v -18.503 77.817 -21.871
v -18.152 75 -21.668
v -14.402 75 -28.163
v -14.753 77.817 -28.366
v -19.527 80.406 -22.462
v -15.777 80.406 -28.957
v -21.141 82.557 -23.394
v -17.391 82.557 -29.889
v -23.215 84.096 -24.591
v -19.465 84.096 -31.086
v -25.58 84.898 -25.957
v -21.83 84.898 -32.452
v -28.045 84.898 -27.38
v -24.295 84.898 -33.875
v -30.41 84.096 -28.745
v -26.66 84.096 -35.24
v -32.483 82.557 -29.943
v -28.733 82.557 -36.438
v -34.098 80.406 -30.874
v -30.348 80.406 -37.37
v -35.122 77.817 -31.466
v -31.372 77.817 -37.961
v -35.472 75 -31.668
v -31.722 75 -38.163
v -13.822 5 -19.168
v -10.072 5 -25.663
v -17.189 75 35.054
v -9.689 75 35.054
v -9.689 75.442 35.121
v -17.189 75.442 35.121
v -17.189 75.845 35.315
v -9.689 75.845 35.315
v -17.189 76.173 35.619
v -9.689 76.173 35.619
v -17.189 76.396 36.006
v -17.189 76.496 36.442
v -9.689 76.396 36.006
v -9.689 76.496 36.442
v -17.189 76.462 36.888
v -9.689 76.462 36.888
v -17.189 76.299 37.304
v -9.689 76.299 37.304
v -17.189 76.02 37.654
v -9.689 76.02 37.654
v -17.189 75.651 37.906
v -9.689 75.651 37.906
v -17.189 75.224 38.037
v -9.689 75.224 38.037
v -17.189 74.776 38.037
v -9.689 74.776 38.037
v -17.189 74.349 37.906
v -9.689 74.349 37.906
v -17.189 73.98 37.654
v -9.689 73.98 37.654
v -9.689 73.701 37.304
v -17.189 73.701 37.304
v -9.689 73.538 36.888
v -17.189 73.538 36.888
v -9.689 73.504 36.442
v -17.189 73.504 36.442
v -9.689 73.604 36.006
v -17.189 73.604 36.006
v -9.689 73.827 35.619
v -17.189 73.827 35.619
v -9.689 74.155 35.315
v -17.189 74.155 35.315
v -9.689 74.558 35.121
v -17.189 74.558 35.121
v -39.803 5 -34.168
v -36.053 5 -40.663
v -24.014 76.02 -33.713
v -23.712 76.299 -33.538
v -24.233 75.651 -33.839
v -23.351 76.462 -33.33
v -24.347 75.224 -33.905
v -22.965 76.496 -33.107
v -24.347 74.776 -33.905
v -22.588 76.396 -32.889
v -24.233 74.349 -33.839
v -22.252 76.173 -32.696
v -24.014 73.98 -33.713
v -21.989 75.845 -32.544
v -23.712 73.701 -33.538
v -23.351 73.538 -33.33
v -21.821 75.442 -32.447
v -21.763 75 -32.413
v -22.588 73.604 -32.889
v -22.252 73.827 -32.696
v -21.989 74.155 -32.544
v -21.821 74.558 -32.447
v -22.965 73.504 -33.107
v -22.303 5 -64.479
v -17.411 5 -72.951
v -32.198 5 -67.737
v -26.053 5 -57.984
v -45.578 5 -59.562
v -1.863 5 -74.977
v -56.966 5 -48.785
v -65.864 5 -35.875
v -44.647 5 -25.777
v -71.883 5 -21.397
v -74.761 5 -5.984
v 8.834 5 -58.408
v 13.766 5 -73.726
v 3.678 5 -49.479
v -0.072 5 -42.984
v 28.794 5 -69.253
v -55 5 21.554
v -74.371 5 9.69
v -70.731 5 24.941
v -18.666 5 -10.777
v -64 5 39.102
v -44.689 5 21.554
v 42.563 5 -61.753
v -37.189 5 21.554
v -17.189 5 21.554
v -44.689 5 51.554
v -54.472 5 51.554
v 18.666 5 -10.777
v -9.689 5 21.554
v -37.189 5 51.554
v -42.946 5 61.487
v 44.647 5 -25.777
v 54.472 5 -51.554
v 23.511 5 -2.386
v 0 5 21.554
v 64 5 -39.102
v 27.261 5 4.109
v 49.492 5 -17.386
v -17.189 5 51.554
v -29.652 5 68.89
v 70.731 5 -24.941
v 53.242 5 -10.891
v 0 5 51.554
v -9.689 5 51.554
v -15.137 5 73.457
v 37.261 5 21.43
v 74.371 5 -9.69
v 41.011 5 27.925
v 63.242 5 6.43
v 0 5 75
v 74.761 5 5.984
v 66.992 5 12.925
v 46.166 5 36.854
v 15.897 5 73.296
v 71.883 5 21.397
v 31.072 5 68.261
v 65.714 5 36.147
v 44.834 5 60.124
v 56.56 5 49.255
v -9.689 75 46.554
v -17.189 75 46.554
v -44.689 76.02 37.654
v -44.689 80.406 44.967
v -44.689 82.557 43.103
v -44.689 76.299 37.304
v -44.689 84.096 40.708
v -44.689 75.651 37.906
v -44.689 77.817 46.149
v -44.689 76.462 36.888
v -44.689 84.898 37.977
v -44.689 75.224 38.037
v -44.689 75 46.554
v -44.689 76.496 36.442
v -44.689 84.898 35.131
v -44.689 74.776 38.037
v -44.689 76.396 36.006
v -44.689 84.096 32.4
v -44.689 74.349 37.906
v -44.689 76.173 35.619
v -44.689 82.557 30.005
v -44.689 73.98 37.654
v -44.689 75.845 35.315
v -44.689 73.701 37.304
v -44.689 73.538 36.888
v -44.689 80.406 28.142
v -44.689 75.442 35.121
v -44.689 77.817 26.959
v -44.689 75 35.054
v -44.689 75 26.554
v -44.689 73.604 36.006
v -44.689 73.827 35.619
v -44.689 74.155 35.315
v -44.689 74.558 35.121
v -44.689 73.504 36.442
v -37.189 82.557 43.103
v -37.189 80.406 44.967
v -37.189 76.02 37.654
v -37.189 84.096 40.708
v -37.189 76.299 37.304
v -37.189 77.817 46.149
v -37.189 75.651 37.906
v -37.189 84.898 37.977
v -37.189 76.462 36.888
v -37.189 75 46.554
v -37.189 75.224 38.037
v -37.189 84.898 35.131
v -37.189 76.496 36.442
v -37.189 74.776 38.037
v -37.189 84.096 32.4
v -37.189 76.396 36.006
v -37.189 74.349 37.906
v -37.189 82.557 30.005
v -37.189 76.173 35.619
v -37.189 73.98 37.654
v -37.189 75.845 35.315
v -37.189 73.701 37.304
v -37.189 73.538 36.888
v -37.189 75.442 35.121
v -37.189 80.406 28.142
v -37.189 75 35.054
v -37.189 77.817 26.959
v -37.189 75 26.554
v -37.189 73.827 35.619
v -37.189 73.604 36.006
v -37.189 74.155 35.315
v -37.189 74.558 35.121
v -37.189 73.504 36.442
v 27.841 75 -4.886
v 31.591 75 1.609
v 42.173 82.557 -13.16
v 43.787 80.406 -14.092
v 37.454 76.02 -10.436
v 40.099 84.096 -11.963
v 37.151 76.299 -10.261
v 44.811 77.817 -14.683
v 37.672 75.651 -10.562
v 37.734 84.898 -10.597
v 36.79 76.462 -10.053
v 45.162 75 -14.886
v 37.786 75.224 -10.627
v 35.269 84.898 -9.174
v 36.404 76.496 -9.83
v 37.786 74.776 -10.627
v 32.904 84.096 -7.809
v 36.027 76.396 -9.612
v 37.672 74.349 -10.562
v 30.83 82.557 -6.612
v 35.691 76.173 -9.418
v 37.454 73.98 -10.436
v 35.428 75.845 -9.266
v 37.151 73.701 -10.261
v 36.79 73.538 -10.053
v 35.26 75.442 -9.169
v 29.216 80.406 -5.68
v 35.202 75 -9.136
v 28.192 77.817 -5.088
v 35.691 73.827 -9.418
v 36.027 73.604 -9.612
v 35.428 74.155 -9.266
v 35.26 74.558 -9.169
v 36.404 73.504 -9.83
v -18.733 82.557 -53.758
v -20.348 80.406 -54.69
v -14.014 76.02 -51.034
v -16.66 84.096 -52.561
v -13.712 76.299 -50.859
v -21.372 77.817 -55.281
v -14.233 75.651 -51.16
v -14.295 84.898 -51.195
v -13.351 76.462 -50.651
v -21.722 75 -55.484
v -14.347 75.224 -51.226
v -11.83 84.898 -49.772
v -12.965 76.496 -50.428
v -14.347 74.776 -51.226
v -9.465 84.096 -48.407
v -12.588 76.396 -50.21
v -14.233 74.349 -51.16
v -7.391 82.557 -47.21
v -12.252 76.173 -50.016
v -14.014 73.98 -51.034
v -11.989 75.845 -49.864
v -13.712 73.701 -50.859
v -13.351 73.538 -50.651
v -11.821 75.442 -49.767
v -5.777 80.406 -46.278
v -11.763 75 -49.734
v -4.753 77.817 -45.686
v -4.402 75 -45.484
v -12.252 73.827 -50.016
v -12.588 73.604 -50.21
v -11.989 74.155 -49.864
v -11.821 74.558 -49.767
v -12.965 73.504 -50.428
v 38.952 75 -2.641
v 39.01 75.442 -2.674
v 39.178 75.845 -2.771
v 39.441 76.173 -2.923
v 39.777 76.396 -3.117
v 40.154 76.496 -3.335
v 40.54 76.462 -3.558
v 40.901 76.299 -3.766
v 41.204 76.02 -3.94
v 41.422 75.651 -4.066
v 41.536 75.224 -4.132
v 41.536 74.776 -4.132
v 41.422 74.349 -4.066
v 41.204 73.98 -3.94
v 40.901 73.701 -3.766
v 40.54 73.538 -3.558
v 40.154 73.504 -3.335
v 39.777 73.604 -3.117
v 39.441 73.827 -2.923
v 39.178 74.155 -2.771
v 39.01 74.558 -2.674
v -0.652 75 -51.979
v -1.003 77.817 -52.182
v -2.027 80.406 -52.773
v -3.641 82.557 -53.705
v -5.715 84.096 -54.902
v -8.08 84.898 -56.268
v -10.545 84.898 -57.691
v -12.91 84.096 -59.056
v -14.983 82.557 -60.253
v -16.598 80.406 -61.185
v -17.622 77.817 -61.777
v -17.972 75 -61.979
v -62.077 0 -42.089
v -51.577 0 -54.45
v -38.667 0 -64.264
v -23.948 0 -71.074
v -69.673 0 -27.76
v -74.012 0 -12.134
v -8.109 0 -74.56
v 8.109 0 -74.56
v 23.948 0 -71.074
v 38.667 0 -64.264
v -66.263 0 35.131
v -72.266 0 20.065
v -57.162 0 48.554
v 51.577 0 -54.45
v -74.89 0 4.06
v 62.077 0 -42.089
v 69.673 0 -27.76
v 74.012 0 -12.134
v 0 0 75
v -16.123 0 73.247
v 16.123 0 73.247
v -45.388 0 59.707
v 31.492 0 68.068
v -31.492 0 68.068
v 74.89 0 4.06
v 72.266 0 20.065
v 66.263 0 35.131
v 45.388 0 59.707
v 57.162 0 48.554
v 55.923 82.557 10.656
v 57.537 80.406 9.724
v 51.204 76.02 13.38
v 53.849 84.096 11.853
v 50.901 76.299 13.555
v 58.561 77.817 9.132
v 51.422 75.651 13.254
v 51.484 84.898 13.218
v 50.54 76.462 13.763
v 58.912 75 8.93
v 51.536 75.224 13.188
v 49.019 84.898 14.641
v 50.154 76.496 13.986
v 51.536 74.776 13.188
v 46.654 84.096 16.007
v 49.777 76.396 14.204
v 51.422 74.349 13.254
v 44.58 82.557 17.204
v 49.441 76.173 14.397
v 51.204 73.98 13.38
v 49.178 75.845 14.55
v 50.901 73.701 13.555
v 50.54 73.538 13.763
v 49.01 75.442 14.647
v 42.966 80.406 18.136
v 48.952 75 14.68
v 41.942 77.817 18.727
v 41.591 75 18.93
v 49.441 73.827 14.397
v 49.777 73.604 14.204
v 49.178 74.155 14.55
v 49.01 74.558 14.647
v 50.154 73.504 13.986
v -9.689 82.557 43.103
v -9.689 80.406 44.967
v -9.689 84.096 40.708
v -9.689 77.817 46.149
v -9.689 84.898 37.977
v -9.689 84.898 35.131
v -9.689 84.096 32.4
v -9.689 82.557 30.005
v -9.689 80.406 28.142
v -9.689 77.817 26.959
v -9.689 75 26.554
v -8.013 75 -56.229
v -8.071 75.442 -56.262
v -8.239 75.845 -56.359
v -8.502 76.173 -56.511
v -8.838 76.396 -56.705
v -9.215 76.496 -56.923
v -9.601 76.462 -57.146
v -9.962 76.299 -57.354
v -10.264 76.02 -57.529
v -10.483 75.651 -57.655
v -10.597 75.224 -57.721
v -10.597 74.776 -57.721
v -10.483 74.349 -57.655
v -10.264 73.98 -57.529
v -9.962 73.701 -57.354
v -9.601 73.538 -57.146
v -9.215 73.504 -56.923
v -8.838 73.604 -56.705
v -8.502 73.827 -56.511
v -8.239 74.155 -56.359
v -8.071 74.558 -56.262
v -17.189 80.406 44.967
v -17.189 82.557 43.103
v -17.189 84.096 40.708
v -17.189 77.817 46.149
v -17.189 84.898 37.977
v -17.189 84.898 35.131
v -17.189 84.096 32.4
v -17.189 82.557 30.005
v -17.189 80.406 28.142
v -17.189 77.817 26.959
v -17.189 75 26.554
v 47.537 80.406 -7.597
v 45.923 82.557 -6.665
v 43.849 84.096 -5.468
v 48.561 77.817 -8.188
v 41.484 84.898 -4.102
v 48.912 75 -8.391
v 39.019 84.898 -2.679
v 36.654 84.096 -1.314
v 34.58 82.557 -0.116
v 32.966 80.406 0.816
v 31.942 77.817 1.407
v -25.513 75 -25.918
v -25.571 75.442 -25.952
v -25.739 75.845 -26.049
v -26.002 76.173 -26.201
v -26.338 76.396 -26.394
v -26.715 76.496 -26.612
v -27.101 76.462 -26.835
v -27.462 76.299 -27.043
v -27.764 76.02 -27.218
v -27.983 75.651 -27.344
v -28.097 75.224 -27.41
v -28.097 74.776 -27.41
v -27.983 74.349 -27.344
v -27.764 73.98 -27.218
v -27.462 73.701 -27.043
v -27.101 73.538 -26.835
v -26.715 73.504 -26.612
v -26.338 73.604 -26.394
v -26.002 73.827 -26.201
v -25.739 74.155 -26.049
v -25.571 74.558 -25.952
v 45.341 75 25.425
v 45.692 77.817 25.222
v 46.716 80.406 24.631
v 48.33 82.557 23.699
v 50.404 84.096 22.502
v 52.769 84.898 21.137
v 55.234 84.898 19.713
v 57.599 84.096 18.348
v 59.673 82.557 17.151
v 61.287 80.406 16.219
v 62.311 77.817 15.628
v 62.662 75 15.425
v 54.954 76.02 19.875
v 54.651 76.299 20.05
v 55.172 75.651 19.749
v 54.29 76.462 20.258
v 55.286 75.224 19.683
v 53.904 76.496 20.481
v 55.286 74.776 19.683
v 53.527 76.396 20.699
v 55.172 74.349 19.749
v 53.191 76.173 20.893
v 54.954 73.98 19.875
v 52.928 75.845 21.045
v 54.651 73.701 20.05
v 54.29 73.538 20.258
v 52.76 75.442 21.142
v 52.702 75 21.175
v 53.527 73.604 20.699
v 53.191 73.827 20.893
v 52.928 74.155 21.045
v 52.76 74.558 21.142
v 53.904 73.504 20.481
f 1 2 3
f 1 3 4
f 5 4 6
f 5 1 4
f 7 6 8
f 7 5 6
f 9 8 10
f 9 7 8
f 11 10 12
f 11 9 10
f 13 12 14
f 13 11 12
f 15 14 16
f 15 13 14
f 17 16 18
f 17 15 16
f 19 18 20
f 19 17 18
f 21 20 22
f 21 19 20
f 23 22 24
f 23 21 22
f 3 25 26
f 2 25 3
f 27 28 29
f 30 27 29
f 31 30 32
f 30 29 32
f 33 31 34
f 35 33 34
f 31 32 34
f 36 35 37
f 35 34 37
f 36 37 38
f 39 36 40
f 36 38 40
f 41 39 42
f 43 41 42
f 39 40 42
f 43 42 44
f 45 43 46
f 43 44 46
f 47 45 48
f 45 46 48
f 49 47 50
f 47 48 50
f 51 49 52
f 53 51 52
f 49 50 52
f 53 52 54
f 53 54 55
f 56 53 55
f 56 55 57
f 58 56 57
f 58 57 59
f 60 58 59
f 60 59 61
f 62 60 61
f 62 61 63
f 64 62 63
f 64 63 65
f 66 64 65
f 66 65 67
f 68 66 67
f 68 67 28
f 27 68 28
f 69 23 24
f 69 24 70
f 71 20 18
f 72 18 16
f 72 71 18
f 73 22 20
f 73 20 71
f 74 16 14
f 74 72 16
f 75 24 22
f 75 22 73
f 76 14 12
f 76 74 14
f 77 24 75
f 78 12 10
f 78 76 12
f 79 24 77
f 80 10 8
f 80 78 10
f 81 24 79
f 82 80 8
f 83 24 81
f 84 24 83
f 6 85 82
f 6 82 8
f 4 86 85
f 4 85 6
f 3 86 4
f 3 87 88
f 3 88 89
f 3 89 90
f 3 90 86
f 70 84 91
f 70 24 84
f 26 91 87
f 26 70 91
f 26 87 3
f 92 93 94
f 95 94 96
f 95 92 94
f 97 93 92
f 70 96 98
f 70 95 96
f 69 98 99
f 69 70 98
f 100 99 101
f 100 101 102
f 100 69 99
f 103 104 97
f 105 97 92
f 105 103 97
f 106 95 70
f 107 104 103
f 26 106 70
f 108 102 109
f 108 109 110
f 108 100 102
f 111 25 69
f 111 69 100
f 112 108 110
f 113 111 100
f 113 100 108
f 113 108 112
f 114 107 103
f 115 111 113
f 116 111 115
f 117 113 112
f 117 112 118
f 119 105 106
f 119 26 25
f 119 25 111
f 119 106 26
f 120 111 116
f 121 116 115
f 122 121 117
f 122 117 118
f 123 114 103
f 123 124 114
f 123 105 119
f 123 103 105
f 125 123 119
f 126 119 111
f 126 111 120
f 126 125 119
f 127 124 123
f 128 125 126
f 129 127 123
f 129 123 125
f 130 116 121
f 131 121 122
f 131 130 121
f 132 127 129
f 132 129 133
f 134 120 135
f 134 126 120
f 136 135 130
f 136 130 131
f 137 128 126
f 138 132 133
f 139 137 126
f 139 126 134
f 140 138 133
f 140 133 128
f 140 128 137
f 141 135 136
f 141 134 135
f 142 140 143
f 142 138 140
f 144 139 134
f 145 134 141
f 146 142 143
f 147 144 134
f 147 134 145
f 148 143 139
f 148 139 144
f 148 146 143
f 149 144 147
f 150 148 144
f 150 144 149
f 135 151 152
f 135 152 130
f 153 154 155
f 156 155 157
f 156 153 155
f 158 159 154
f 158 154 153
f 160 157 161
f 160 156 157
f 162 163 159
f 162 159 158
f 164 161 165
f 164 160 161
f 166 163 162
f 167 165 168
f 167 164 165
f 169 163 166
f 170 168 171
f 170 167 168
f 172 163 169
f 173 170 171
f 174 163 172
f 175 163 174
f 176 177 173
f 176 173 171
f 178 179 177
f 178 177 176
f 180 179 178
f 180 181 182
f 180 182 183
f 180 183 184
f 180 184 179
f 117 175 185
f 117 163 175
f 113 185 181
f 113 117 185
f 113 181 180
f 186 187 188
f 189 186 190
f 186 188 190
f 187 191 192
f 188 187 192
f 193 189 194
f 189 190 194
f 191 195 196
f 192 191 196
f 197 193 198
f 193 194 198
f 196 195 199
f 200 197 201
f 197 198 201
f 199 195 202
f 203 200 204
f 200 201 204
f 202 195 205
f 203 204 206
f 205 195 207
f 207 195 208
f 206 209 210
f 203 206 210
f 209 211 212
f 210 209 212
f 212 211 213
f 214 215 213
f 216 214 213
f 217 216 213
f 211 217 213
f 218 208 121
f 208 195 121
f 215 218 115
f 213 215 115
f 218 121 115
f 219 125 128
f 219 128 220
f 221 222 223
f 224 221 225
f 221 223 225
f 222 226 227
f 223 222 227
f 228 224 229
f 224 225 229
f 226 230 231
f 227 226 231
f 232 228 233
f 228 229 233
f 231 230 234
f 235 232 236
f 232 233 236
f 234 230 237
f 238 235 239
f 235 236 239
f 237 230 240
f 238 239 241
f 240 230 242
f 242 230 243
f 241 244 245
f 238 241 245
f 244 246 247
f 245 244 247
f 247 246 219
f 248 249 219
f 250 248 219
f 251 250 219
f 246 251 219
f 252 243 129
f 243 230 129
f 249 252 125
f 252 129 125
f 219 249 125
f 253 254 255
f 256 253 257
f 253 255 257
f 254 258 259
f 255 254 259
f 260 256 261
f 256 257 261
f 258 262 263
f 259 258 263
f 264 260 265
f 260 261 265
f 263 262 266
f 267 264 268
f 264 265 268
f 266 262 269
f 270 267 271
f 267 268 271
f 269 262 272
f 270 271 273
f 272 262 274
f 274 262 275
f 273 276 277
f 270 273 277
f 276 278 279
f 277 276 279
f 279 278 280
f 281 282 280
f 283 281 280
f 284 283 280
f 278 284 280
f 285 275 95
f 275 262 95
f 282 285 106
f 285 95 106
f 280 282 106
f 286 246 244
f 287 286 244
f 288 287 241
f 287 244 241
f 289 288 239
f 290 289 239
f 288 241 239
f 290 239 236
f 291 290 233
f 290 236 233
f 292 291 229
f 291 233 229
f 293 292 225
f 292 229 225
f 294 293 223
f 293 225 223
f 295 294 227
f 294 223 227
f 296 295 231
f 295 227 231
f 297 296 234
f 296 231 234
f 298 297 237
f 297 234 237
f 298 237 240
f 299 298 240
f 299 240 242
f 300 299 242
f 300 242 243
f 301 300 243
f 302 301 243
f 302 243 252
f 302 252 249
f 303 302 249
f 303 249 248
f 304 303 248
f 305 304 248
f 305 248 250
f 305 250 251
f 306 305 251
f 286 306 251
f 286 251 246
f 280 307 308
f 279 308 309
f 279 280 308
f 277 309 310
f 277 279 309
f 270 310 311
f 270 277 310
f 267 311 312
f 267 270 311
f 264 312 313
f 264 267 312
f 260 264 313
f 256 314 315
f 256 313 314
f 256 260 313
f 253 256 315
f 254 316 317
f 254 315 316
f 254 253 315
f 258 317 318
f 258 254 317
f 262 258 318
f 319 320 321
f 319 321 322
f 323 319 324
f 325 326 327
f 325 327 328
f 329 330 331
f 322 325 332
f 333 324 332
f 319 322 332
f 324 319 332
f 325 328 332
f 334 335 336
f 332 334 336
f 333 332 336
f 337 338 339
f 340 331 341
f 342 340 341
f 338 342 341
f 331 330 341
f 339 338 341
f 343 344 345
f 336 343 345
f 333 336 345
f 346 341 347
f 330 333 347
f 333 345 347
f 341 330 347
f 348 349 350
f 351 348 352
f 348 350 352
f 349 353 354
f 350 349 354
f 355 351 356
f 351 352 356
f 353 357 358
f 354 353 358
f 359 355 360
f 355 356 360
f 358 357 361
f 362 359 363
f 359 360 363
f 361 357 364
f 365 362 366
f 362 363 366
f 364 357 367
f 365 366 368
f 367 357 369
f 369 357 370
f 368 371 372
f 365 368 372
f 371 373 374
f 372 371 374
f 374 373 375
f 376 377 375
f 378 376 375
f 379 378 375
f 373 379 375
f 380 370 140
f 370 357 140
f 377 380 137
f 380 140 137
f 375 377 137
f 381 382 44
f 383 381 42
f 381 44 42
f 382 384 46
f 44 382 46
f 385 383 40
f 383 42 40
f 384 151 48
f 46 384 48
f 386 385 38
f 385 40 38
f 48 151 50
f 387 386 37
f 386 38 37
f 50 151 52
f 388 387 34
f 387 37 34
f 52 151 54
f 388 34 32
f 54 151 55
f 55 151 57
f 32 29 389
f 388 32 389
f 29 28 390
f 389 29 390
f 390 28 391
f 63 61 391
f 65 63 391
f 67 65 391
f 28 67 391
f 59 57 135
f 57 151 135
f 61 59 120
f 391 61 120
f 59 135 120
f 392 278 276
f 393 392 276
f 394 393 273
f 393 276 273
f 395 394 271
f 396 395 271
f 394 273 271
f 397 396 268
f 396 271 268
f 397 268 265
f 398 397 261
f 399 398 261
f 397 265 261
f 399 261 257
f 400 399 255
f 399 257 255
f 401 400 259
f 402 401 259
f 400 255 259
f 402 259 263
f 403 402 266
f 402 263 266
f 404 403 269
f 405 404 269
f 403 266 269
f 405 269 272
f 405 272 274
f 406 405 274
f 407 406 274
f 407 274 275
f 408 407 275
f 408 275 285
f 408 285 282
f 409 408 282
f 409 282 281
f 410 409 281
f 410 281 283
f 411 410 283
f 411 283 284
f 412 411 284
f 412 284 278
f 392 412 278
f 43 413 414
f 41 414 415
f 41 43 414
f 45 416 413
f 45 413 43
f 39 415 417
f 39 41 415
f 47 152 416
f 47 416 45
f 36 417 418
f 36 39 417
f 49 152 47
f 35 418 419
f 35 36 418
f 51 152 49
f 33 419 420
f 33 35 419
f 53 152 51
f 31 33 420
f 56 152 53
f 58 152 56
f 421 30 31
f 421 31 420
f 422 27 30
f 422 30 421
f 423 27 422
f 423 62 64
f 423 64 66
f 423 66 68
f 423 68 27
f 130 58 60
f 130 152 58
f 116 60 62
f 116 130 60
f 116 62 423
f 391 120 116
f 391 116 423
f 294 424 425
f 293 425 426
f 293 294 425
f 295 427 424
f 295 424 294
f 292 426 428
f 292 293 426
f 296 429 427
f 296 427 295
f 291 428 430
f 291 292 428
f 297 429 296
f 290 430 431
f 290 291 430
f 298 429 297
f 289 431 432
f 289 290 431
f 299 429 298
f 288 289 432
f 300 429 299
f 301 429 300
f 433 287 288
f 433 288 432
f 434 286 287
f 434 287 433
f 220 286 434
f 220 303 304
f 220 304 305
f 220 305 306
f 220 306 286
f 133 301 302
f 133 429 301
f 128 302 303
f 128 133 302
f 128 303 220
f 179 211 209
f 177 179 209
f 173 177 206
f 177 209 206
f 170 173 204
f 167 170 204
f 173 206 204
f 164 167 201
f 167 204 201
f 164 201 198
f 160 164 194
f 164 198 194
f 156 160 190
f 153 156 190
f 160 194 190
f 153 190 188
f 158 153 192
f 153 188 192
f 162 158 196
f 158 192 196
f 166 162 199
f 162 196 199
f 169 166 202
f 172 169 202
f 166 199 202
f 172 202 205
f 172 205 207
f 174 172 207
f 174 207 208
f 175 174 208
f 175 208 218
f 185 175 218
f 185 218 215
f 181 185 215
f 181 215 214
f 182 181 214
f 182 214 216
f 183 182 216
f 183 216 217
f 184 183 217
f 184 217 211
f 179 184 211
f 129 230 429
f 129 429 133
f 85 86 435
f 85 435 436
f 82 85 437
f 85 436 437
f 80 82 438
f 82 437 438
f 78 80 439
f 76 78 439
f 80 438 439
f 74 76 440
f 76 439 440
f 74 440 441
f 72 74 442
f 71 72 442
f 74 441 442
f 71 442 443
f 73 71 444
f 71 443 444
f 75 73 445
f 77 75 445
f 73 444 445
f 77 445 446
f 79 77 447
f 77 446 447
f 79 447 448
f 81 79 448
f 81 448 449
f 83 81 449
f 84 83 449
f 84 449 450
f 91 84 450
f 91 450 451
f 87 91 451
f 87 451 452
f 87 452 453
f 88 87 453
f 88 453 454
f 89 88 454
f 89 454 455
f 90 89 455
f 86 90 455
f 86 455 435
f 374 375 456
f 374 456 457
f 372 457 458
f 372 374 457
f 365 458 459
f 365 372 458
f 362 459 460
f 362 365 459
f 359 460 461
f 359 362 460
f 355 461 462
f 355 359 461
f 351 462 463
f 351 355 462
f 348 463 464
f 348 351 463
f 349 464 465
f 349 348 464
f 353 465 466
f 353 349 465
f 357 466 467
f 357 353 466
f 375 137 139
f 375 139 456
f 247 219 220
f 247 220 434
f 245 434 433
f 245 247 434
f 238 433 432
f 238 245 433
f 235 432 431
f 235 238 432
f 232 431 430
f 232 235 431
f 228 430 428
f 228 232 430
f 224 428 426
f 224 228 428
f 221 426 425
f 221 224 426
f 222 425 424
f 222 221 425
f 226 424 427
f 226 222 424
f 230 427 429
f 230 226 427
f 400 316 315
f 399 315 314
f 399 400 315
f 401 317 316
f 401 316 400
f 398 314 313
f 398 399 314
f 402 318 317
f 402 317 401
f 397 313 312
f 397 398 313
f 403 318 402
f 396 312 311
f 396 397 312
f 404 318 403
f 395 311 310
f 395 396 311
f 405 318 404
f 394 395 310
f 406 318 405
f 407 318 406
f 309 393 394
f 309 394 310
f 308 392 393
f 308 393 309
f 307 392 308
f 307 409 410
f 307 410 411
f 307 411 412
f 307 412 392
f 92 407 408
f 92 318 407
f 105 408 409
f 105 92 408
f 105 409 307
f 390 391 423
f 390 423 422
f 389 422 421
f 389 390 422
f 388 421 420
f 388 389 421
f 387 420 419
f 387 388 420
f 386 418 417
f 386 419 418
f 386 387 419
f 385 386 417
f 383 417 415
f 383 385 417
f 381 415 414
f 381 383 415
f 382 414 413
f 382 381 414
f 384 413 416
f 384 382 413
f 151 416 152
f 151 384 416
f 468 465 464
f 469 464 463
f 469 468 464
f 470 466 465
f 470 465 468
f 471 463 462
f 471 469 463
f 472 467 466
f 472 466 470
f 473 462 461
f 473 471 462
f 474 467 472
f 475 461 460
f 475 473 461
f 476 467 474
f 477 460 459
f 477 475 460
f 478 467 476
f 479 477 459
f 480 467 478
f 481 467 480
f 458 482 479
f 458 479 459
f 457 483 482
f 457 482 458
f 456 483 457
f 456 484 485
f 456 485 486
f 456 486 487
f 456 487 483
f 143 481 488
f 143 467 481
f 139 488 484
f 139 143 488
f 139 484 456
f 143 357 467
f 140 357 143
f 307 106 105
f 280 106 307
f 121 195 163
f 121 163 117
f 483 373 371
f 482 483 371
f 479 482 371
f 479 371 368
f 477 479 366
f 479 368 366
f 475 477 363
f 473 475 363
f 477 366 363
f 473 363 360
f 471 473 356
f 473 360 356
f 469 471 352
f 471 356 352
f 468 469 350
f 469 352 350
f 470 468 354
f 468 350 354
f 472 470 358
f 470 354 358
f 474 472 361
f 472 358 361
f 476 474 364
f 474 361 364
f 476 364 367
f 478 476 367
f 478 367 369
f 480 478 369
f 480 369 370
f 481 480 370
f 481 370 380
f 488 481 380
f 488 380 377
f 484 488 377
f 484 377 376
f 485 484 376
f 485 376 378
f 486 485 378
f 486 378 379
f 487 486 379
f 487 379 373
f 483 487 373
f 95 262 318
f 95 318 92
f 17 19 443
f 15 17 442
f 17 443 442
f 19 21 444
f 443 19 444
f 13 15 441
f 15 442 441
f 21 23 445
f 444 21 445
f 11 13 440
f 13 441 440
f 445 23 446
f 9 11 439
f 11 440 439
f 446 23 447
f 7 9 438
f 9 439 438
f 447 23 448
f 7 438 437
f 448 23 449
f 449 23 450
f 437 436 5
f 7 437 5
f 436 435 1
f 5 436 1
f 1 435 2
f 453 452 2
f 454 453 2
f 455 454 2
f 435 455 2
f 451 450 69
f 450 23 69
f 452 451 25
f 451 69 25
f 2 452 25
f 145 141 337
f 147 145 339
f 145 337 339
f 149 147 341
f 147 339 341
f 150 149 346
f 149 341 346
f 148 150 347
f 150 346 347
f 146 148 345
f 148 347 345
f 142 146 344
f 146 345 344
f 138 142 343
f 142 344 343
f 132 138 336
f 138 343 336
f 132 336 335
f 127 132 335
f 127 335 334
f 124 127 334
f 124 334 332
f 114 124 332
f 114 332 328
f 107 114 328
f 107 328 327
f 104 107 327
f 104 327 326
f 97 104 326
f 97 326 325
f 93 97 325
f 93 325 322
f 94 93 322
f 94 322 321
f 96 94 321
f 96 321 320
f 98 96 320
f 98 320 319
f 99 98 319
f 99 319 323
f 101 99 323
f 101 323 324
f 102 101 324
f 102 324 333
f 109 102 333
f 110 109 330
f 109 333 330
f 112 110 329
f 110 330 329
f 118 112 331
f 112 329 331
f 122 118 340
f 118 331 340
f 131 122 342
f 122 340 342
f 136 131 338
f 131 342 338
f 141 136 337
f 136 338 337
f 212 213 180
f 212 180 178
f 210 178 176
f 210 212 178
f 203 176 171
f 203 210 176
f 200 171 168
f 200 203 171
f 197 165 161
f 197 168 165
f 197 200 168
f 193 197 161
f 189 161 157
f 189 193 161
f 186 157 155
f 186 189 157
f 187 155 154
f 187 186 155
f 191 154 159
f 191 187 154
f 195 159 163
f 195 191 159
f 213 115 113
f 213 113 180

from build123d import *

# Parameters (mm, degrees)
SKETCH2_R          = 75
EXTRUDE1_DEPTH     = 5
EXTRUDE3_START     = 5
SKETCH1_W          = 7.5
SKETCH1_H          = 30
EXTRUDE3_DEPTH     = 80
SKETCH3_R          = 1.5
CUT_EXTRUDE1_DEPTH = 55
CIRPATTERN1_COUNT  = 3


with BuildPart() as part:
    # Sketch2 → Extrude1 (new body)
    with BuildSketch(Plane(origin=(0, 0, 0), x_dir=(1, 0, 0), z_dir=(0, 1, 0))):
        with Locations(Location((0, 0, 0), (0, 0, 270))):
            Circle(SKETCH2_R)
    extrude(amount=EXTRUDE1_DEPTH)

    # Sketch1 → Extrude3 (add)
    with BuildSketch(Plane(origin=(0, 0, 0), x_dir=(1, 0, 0), z_dir=(0, 1, 0)).offset(EXTRUDE3_START)):
        with Locations((-13.439285714, -36.554084254)):
            Rectangle(SKETCH1_W, SKETCH1_H)
        with Locations((-40.939285714, -36.554084254)):
            Rectangle(SKETCH1_W, SKETCH1_H)
    extrude3 = extrude(amount=EXTRUDE3_DEPTH)

    # Sketch3 → Cut-Extrude1 (cut)
    with BuildSketch(Plane(origin=(0, 0, 0), x_dir=(0, 0, -1), z_dir=(1, 0, 0))):
        with Locations((-36.554084254, 75)):
            Circle(SKETCH3_R)
        with BuildLine():
            Line((-51.554084254, 5), (-52.554084254, 6))
            Line((-52.554084254, 6), (-52.554084254, 86))
            Line((-52.554084254, 86), (-20.554084254, 86))
            Line((-20.554084254, 86), (-20.554084254, 6))
            Line((-20.554084254, 6), (-21.554084254, 5))
            Line((-21.554084254, 5), (-26.554084254, 75))
            ThreePointArc((-26.554084254, 75), (-36.554084254, 85), (-46.554084254, 75))
            Line((-46.554084254, 75), (-51.554084254, 5))
        make_face()
    cut_extrude1 = extrude(amount=-CUT_EXTRUDE1_DEPTH, mode=Mode.SUBTRACT)

    # CirPattern1: Extrude3, Cut-Extrude1 ×3 about axis
    cirpattern1_axis = Axis((0, 0, 0), (0, 1, 0))
    add([extrude3.rotate(cirpattern1_axis, i * 360 / CIRPATTERN1_COUNT) for i in range(1, CIRPATTERN1_COUNT)])
    add([cut_extrude1.rotate(cirpattern1_axis, i * 360 / CIRPATTERN1_COUNT) for i in range(1, CIRPATTERN1_COUNT)], mode=Mode.SUBTRACT)


solid = part.part
